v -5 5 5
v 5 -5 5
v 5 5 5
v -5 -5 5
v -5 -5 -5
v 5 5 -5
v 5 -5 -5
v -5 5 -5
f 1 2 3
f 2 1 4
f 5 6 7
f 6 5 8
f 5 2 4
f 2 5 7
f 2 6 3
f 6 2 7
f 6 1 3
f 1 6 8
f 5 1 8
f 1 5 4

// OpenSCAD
// A cube
// The only example, embedded by the hand-written page.
cube(10, center = true);
